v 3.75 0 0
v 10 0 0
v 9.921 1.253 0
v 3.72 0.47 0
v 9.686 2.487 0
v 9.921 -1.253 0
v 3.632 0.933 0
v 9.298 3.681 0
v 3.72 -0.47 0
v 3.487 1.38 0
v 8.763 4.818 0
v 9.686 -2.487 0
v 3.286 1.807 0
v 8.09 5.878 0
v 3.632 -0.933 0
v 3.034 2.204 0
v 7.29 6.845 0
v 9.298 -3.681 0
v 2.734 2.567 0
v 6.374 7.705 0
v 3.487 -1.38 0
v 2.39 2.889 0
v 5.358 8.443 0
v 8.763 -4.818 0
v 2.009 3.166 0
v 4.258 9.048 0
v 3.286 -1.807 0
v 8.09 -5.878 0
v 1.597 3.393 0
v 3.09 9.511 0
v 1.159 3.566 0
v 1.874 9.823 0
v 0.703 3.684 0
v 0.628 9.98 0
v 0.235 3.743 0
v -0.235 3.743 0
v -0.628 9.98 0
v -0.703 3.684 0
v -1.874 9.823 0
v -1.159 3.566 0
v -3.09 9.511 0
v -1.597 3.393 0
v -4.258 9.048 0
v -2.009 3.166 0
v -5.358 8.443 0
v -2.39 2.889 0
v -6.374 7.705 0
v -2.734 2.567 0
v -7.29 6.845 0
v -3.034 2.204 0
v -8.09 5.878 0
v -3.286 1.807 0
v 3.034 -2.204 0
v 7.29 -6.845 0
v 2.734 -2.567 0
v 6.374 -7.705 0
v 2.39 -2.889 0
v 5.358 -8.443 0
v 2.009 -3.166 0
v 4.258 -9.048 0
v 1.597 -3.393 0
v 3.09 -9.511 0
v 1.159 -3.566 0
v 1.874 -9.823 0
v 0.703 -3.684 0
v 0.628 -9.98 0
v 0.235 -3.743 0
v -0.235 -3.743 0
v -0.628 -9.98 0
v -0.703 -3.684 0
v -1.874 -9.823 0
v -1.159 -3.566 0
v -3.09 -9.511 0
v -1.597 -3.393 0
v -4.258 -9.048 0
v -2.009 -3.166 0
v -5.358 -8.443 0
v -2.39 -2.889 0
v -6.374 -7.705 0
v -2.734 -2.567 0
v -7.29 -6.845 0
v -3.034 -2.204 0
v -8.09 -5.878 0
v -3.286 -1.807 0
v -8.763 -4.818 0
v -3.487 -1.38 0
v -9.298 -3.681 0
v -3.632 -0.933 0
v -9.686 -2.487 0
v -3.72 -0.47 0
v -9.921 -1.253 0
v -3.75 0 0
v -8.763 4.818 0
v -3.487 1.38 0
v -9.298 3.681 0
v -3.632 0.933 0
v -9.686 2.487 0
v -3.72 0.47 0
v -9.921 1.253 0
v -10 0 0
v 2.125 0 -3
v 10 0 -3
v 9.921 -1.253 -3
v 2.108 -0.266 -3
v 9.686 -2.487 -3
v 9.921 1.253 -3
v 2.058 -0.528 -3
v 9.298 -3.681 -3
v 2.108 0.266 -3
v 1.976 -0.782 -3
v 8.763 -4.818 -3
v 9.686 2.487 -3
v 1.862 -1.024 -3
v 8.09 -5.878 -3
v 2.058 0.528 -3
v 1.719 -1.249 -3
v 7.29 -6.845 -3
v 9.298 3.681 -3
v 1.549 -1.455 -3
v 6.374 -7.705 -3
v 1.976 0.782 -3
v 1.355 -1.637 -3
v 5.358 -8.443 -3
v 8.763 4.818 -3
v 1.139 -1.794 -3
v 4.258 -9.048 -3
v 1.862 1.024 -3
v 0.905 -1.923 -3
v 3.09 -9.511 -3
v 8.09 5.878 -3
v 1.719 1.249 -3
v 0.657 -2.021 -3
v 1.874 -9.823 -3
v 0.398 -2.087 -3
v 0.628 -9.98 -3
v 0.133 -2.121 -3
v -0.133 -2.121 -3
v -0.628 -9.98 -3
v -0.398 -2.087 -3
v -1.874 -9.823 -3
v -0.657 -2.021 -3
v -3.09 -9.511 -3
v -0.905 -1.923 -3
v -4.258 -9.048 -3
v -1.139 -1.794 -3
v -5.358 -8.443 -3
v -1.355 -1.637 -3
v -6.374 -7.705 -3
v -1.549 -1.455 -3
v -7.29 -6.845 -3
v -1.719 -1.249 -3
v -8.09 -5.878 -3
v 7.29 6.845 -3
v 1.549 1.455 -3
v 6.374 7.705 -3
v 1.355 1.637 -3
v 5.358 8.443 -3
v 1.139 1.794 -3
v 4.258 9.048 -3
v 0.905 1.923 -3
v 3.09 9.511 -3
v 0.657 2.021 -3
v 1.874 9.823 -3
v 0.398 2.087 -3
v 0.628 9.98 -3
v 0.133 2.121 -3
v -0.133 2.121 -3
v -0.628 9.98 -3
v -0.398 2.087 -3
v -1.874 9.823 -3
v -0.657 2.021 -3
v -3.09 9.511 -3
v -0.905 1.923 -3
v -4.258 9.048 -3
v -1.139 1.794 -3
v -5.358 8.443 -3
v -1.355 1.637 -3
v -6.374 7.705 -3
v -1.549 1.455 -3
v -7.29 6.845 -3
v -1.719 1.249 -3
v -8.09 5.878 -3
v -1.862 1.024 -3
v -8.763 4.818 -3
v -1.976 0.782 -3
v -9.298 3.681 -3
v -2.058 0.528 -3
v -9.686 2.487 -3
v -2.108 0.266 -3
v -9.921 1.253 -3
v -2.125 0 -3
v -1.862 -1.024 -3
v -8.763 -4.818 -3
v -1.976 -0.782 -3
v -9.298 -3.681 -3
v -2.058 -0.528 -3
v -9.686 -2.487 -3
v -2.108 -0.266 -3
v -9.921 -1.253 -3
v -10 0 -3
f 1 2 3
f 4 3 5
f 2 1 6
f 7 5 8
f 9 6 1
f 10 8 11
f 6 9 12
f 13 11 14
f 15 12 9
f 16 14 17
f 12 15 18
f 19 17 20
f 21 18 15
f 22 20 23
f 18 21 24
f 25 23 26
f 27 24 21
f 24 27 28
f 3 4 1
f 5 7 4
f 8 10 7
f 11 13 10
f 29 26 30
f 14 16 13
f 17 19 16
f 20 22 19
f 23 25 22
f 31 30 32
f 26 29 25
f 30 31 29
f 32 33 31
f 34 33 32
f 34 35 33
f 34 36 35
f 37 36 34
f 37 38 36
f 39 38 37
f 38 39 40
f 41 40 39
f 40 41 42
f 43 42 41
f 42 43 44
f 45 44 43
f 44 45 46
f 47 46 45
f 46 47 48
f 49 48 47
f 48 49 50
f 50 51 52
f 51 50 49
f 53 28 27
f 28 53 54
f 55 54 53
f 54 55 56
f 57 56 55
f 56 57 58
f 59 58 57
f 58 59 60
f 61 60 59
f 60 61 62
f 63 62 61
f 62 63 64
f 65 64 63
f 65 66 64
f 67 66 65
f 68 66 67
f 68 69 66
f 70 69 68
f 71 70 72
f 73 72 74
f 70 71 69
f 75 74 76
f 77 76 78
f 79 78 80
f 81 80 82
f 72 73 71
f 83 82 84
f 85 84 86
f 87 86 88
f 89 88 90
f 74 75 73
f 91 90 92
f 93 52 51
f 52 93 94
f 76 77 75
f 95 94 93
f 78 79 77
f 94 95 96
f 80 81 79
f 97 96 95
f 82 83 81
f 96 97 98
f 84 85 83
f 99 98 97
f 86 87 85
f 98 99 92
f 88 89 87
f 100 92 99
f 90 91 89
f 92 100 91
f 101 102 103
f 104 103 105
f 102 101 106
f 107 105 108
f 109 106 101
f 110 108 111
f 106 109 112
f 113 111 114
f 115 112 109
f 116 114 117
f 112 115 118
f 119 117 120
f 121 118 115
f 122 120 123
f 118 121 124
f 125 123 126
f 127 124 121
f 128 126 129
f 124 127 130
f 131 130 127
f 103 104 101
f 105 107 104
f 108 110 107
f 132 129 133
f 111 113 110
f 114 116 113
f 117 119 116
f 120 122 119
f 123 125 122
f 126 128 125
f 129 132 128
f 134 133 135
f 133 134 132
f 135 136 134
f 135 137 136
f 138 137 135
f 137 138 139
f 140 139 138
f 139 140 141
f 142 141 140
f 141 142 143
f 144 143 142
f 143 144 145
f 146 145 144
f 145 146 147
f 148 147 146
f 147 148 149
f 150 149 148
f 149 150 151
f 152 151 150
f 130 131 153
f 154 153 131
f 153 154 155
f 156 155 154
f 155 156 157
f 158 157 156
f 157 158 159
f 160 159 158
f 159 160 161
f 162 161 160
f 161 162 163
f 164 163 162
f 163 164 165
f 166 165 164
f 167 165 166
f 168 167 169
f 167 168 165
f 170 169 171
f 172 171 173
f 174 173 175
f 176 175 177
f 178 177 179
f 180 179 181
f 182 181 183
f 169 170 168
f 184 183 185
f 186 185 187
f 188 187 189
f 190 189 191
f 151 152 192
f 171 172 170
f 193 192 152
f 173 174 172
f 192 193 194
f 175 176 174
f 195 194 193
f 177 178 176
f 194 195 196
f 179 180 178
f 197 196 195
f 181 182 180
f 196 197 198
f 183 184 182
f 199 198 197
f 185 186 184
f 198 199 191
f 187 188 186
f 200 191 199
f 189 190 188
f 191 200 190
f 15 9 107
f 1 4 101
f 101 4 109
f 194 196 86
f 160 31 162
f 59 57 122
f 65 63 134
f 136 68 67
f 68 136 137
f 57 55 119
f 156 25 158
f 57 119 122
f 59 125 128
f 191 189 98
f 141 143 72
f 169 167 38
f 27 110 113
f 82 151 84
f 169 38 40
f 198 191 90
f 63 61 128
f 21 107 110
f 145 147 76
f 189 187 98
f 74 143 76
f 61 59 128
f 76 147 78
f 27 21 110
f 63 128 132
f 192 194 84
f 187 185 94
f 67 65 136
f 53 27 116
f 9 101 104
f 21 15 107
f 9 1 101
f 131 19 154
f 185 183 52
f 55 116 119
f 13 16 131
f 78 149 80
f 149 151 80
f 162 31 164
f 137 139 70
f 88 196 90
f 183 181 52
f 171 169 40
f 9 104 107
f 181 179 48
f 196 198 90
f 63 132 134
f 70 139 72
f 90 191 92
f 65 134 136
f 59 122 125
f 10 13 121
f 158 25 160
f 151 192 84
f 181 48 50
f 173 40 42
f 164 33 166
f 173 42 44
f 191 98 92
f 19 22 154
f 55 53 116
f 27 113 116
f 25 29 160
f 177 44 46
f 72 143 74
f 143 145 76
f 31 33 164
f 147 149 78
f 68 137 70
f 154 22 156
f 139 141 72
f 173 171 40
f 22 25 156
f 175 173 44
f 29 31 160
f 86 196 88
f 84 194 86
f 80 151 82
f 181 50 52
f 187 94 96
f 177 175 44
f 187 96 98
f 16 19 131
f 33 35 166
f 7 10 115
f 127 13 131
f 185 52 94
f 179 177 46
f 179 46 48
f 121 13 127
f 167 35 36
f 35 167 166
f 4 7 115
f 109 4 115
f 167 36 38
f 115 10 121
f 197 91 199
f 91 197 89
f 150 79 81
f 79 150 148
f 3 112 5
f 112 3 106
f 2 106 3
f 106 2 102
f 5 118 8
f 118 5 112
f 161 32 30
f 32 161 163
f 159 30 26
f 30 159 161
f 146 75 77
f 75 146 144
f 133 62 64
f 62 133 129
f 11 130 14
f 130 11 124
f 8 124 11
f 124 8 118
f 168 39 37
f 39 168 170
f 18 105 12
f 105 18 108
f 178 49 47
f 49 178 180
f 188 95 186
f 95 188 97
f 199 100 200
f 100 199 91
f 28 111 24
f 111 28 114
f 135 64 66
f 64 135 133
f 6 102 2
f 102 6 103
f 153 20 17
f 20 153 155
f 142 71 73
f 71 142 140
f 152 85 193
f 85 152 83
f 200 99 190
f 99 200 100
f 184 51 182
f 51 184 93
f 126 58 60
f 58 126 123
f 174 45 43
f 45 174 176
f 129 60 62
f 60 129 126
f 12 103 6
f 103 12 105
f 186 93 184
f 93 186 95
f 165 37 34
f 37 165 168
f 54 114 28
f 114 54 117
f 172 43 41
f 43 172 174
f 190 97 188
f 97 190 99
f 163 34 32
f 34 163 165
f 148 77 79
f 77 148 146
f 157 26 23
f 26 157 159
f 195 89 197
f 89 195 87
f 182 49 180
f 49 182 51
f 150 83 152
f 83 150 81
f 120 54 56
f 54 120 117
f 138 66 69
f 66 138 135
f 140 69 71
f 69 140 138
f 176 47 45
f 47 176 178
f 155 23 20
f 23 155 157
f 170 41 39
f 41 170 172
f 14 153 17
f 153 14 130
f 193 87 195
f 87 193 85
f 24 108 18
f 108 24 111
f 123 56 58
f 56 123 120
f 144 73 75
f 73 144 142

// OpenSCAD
$fn = 50;


difference() {
	union() {
		translate(v = [0, 0, -3.0000000000]) {
			cylinder(h = 3, r = 10.0000000000);
		}
	}
	union() {
		translate(v = [0, 0, 0]) {
			rotate(a = [0, 0, 0]) {
				difference() {
					union() {
						#translate(v = [0, 0, -3.0000000000]) {
							cylinder(h = 3, r = 2.0000000000);
						}
						#translate(v = [0, 0, -3]) {
							cylinder(h = 3, r = 10.0000000000, r1 = 2.1250000000, r2 = 3.7500000000);
						}
						#translate(v = [0, 0, -3.0000000000]) {
							cylinder(h = 3, r = 2.1250000000);
						}
						#translate(v = [0, 0, -3.0000000000]) {
							cylinder(h = 3, r = 2.0000000000);
						}
					}
					union();
				}
			}
		}
	}
}
